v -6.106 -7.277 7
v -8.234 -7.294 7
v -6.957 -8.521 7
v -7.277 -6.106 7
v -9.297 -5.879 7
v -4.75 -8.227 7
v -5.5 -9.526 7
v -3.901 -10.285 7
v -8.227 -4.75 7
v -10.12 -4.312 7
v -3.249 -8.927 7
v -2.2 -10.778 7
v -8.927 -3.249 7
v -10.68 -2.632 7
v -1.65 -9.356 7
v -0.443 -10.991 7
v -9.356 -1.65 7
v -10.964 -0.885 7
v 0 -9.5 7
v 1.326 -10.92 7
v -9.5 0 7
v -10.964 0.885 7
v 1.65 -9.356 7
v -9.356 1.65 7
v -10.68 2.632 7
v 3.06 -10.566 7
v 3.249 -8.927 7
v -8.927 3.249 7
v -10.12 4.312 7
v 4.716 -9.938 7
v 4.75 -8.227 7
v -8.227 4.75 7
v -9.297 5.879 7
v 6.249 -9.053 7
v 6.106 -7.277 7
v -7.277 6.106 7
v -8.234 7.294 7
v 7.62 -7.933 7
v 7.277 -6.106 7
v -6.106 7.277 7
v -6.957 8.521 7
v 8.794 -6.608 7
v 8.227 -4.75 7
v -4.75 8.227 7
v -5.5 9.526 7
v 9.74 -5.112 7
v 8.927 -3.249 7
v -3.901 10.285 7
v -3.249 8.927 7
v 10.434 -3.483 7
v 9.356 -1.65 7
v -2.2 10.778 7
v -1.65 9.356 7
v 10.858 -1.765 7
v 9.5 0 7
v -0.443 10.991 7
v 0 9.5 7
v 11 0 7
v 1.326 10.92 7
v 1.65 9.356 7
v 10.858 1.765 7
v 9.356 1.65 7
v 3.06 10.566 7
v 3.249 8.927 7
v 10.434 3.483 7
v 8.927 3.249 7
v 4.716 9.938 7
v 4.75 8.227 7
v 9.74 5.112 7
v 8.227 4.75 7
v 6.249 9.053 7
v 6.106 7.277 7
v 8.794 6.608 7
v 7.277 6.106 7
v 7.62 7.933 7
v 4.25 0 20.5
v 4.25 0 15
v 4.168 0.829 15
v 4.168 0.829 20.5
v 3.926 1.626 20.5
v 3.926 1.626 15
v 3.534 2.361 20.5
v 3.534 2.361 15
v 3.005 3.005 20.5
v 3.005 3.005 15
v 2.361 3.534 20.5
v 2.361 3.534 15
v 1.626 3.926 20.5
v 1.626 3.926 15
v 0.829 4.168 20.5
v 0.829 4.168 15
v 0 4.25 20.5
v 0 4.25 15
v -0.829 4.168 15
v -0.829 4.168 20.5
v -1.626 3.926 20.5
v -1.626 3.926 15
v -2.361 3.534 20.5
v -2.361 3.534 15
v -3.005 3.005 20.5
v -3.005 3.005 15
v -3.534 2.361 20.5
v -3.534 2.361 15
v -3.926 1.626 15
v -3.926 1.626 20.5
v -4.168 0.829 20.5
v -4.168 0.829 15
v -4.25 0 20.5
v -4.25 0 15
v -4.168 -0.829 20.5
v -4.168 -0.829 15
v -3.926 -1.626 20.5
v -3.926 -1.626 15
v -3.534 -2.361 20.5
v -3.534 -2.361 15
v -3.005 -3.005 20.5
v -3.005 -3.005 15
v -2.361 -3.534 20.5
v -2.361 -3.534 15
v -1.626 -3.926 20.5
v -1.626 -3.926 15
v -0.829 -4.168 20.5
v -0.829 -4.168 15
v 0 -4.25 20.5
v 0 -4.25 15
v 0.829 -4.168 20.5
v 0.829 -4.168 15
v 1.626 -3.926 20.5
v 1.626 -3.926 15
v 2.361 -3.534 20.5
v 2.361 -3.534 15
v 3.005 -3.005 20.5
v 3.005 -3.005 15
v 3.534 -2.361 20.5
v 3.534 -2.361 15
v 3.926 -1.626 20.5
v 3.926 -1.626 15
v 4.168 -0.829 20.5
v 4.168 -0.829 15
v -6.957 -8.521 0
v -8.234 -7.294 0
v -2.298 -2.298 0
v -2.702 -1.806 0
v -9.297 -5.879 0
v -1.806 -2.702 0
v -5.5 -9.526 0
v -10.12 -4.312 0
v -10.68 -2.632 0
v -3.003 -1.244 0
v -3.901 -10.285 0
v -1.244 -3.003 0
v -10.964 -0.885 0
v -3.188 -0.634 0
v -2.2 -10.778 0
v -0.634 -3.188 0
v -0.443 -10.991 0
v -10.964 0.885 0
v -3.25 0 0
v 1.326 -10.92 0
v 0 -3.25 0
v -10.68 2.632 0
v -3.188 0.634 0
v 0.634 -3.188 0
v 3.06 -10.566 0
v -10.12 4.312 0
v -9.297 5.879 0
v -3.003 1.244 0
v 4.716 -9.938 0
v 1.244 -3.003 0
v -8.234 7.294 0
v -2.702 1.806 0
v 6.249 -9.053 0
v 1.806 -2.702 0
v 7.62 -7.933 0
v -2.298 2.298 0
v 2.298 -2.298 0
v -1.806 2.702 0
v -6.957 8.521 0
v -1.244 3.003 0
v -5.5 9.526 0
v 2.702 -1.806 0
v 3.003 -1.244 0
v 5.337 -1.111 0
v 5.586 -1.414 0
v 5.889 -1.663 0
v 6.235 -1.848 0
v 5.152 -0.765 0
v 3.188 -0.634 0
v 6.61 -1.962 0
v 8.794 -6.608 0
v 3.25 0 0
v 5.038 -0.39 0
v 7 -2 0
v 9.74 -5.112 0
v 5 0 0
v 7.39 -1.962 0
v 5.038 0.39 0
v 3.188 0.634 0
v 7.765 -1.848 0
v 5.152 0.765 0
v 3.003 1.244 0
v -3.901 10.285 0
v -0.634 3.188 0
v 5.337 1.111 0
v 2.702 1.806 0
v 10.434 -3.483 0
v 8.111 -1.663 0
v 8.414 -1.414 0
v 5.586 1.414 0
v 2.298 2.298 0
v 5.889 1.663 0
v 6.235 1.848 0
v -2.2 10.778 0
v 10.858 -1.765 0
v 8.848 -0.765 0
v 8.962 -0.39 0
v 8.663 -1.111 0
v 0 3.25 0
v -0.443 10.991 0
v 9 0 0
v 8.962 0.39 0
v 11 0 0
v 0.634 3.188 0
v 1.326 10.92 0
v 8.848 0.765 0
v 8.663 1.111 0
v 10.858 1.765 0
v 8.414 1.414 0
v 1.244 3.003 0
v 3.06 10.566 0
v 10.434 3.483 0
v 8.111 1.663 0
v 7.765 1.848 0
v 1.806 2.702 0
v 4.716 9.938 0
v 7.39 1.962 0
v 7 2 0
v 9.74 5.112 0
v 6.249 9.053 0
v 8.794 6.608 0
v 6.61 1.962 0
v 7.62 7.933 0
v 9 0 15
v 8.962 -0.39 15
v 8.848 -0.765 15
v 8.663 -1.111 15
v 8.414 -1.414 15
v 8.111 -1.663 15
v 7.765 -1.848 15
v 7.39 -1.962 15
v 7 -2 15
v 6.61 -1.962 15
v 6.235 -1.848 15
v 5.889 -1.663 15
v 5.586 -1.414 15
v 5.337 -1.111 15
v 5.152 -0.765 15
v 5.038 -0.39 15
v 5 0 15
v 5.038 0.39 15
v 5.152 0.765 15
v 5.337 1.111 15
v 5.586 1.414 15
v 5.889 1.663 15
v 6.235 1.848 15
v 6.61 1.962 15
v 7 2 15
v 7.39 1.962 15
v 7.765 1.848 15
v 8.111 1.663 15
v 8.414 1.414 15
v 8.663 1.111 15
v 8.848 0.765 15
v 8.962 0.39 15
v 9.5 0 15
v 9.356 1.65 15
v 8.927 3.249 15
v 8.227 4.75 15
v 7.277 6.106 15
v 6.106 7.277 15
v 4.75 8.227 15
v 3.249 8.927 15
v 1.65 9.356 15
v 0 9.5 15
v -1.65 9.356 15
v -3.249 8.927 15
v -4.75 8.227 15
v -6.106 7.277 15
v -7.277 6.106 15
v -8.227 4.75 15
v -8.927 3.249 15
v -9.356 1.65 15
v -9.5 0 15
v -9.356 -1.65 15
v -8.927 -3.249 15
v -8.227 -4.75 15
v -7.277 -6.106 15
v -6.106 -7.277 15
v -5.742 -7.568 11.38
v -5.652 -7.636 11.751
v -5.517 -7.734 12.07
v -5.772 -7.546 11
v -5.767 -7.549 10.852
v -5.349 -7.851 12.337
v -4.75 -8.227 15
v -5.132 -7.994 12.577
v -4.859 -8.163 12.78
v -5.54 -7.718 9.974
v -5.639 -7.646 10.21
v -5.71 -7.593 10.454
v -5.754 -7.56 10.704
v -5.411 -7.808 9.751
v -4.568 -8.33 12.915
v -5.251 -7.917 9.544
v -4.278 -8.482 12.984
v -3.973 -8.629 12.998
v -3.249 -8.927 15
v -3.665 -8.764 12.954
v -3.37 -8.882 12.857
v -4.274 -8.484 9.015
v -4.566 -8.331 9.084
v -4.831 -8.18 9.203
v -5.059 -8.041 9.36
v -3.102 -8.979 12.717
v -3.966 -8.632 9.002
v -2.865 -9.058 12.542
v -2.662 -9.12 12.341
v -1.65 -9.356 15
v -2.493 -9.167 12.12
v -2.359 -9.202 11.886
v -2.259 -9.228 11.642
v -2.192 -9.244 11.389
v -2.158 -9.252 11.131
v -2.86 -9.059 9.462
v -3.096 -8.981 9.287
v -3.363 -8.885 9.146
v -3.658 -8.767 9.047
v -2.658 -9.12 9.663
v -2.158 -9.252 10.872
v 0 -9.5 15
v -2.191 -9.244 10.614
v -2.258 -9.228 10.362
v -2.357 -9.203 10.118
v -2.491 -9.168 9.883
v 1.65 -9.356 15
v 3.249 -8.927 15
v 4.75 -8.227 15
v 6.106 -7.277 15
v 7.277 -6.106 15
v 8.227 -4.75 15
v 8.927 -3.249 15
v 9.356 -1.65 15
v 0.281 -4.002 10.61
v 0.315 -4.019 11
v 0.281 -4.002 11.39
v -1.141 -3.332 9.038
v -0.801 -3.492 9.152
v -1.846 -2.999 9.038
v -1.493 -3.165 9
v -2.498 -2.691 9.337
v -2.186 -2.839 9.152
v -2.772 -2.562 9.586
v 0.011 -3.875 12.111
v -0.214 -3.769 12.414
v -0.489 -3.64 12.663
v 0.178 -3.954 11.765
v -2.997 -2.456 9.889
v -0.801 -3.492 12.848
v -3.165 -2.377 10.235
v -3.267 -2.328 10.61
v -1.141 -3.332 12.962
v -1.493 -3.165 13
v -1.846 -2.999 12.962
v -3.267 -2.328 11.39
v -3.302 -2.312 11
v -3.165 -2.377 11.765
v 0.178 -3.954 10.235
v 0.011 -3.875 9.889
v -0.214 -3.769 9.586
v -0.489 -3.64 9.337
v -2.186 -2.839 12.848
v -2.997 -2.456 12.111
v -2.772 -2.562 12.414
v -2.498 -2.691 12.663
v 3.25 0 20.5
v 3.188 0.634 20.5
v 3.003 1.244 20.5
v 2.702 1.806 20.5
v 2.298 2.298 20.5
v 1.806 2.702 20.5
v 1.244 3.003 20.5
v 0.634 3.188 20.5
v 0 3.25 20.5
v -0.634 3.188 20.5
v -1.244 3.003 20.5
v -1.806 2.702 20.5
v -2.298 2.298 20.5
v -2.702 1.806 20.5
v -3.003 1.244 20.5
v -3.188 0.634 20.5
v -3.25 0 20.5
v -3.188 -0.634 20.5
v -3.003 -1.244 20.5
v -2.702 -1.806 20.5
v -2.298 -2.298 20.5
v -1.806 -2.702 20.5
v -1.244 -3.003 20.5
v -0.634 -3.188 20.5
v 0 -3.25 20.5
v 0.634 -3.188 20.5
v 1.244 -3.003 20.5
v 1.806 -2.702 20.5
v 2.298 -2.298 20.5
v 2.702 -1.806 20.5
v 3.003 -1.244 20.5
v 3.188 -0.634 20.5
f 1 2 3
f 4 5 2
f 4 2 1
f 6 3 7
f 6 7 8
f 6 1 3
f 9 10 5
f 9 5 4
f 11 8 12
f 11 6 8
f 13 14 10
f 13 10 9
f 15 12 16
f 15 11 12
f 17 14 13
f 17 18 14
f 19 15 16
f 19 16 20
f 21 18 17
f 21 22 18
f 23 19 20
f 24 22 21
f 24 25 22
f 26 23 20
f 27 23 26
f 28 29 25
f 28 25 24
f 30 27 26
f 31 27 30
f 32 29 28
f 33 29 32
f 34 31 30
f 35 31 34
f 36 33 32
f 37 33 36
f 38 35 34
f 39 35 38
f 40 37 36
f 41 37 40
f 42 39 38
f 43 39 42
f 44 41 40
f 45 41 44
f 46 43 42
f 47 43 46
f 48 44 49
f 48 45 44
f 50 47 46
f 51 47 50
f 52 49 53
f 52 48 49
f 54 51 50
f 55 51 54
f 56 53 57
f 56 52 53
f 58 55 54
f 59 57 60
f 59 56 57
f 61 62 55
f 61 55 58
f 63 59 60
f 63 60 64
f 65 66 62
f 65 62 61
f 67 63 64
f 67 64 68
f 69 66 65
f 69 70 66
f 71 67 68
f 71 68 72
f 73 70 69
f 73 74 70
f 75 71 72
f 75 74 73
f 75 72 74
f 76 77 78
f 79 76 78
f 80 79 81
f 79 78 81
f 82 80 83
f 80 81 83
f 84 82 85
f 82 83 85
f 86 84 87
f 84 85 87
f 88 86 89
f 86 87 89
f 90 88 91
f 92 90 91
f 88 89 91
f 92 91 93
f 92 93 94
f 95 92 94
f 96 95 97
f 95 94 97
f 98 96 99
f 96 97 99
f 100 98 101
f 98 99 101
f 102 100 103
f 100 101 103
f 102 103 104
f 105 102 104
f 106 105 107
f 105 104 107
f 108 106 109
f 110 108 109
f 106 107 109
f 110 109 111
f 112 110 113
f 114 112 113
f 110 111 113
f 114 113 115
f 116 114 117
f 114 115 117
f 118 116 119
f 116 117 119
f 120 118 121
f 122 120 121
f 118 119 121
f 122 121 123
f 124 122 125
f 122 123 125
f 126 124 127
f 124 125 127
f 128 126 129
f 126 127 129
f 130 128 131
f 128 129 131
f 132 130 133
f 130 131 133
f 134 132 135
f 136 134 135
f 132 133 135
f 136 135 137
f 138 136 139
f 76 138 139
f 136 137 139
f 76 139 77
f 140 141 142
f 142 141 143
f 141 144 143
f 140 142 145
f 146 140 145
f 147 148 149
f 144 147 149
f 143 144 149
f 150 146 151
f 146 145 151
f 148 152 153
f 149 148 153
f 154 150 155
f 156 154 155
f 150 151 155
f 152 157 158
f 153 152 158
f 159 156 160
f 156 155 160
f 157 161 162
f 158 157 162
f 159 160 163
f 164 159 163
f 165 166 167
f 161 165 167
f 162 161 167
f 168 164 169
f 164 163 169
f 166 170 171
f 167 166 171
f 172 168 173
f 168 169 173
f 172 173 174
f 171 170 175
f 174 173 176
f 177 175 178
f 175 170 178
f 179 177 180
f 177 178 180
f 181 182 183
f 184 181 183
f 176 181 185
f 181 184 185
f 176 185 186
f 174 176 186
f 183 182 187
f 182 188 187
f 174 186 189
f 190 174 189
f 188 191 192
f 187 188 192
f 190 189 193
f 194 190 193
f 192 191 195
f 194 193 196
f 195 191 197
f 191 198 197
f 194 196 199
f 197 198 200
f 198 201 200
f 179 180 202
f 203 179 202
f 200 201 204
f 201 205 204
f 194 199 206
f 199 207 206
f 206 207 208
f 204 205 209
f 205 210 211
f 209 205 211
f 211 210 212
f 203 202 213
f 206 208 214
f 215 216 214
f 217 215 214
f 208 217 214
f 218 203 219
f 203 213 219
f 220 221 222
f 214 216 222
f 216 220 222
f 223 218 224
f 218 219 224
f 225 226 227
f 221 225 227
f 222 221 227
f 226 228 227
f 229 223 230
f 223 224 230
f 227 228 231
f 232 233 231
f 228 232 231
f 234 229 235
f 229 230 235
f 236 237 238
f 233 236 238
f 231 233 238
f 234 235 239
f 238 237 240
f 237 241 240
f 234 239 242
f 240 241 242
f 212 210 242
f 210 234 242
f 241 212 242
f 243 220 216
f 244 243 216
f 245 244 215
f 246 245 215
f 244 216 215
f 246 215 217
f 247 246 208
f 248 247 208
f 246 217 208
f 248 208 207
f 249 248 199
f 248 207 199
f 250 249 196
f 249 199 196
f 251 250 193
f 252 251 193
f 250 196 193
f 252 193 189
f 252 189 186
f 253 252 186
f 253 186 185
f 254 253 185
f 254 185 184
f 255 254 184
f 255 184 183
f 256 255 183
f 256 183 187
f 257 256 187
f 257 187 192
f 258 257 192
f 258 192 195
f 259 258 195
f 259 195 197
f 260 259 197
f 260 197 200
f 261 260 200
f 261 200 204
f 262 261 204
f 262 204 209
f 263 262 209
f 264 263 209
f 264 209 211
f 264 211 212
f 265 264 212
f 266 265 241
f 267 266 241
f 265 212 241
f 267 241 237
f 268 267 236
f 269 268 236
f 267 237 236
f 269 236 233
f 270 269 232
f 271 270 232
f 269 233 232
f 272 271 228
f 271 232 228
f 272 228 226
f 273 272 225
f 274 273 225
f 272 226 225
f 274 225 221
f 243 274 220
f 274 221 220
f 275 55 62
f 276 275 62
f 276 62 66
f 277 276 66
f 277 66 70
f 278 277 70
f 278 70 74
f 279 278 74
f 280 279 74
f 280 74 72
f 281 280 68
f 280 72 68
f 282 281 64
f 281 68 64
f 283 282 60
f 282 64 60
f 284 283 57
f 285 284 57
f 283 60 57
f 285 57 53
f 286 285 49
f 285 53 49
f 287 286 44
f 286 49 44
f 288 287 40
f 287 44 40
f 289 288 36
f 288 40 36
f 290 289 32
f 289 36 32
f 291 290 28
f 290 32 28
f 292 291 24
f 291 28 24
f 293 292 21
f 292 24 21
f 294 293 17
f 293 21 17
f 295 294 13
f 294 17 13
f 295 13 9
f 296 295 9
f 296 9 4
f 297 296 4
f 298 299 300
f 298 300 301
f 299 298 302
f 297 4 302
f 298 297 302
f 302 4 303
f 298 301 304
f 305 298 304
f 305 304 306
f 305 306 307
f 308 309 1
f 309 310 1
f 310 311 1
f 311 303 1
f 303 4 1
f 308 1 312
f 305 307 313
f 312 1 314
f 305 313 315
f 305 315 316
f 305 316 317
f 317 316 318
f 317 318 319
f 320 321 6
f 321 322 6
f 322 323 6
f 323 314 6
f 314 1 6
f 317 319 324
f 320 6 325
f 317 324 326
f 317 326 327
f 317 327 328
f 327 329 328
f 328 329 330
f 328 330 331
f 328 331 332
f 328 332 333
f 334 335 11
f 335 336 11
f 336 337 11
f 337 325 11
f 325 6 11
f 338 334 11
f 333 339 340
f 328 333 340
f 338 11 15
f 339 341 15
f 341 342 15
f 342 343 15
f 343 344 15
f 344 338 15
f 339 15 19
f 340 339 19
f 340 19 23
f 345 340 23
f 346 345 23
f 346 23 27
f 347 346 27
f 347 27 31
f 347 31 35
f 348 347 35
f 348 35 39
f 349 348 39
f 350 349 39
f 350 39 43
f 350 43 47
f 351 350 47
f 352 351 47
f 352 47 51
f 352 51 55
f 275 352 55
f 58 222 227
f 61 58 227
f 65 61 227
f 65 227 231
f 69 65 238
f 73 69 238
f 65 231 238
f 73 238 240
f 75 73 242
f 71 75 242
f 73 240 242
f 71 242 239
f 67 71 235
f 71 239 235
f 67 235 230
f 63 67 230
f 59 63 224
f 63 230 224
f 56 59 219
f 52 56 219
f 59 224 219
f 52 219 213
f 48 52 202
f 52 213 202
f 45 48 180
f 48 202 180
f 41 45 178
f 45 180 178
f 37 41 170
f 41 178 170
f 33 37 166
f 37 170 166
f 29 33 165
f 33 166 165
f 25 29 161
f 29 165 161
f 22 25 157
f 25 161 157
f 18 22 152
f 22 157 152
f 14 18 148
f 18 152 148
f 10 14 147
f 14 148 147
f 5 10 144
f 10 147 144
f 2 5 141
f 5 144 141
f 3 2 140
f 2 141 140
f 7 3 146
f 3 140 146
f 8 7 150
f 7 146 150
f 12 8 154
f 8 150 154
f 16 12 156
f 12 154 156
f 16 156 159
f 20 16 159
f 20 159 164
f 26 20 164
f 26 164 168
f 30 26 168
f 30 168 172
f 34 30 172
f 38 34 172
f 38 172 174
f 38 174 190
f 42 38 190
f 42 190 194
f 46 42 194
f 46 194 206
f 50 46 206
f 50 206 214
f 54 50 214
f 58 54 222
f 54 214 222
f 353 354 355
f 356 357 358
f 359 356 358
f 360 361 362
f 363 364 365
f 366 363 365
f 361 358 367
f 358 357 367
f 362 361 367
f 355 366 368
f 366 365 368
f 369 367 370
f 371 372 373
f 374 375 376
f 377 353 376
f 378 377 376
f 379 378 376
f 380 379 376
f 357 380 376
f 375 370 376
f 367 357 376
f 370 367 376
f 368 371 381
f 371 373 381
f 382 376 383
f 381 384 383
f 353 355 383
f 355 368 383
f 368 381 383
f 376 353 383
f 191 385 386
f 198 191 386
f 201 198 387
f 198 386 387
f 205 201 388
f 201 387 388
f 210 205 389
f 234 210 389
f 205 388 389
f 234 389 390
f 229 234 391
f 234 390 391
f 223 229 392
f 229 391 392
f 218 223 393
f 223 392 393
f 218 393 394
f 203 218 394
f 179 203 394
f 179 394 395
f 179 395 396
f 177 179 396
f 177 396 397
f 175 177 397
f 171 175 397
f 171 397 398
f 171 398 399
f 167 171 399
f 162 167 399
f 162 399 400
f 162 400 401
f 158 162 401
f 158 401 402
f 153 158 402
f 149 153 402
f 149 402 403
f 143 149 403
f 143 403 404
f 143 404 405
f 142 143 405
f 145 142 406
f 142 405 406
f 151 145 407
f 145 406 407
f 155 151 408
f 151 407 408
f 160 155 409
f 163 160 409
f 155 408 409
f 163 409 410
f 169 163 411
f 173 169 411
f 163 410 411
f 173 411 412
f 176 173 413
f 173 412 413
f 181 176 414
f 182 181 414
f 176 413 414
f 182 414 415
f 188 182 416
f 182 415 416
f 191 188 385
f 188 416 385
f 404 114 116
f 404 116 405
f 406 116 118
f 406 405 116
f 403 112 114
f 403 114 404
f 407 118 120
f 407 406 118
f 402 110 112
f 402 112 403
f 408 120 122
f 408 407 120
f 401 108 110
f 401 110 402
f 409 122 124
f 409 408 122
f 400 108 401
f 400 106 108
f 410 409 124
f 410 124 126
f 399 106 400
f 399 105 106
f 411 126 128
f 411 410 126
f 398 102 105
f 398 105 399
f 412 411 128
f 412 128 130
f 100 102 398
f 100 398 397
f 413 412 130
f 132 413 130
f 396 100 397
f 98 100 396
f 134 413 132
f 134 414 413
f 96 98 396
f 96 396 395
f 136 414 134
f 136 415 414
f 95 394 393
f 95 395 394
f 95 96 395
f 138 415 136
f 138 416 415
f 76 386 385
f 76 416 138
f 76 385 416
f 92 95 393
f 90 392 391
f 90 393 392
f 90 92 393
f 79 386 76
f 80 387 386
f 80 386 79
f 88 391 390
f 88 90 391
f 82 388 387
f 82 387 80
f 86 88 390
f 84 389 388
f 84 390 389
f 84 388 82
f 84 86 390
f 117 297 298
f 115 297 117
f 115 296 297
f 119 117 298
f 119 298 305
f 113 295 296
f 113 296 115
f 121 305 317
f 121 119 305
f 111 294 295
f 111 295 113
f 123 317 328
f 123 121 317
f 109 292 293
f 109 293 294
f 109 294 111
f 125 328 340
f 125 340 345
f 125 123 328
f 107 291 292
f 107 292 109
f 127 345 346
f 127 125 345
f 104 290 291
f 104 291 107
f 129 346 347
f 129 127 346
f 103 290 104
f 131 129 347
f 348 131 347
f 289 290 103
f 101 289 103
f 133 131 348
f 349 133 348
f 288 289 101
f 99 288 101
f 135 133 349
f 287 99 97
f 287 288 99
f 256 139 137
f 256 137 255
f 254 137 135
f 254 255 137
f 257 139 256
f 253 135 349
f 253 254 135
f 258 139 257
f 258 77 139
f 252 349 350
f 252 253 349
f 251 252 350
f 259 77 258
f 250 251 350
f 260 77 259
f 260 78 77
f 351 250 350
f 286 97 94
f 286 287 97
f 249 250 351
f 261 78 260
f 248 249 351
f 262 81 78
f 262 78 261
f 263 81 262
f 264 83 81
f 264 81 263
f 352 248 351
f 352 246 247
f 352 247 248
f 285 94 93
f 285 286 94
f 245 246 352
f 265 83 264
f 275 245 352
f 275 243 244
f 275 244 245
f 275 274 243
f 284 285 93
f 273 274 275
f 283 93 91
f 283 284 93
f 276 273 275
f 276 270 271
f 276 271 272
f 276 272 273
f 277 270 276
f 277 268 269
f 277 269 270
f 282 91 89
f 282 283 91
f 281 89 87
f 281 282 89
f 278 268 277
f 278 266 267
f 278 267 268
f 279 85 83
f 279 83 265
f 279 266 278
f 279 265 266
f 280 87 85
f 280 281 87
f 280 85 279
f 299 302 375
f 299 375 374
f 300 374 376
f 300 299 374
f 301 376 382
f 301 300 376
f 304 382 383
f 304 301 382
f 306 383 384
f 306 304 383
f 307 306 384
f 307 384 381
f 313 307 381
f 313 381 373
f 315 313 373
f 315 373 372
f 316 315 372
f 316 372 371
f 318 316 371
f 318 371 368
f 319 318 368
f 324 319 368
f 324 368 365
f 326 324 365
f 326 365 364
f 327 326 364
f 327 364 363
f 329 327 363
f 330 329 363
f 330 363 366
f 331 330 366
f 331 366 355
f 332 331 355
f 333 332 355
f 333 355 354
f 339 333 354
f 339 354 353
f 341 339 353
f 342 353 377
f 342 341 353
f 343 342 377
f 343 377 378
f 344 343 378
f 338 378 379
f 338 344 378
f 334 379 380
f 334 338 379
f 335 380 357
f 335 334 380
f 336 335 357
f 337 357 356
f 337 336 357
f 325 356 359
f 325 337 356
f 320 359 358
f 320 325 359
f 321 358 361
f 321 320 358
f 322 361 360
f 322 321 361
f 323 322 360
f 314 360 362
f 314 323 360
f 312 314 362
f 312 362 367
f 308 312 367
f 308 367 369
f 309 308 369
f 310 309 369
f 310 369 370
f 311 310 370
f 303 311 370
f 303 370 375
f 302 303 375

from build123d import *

# Parameters (mm, degrees)
F0_R      = 11
F1_DEPTH  = 7
F2_R      = 9.5
F3_DEPTH  = 8
F4_R      = 4.25
F5_DEPTH  = 5.5
F6_R      = 3.25
F7_DEPTH  = 20.501
F8_R      = 2
F9_DEPTH  = 20.501
F12_R     = 2
F13_DEPTH = 6


# Not quite as in the source:
# - a feature names something its author has since deleted; it is built from what else it names


with BuildPart() as f1:
    # F0 (on Top) → F1 (new body)
    with BuildSketch(Plane.XY):
        Circle(F0_R)
    extrude(amount=F1_DEPTH)

    # F2 (on face) → F3 (join)
    with BuildSketch(Plane.XY.offset(7)):
        Circle(F2_R)
    extrude(amount=F3_DEPTH)

    # F4 (on face) → F5 (join)
    with BuildSketch(Plane.XY.offset(15)):
        Circle(F4_R)
    extrude(amount=F5_DEPTH)

    # F6 (on face) → F7 (cut, through all)
    with BuildSketch(Plane.XY.offset(20.5)):
        Circle(F6_R)
    extrude(amount=-F7_DEPTH, mode=Mode.SUBTRACT)

    # F8 (on face) → F9 (cut, through all)
    with BuildSketch(Plane(origin=(0, 0, 0), x_dir=(1, 0, 0), z_dir=(0, 0, -1))):
        with Locations((7, 0)):
            Circle(F8_R)
    extrude(amount=-F9_DEPTH, mode=Mode.SUBTRACT)

    # F12 (on line) → F13 (cut)
    with BuildSketch(Plane(origin=(-4.0535714286, -8.5917727317, 0), x_dir=(-0.9043971297, 0.4266917293, 0), z_dir=(0.4266917293, 0.9043971297, 0))):
        with Locations((0, 11)):
            Circle(F12_R)
    extrude(amount=F13_DEPTH, mode=Mode.SUBTRACT)


solid = f1.part
